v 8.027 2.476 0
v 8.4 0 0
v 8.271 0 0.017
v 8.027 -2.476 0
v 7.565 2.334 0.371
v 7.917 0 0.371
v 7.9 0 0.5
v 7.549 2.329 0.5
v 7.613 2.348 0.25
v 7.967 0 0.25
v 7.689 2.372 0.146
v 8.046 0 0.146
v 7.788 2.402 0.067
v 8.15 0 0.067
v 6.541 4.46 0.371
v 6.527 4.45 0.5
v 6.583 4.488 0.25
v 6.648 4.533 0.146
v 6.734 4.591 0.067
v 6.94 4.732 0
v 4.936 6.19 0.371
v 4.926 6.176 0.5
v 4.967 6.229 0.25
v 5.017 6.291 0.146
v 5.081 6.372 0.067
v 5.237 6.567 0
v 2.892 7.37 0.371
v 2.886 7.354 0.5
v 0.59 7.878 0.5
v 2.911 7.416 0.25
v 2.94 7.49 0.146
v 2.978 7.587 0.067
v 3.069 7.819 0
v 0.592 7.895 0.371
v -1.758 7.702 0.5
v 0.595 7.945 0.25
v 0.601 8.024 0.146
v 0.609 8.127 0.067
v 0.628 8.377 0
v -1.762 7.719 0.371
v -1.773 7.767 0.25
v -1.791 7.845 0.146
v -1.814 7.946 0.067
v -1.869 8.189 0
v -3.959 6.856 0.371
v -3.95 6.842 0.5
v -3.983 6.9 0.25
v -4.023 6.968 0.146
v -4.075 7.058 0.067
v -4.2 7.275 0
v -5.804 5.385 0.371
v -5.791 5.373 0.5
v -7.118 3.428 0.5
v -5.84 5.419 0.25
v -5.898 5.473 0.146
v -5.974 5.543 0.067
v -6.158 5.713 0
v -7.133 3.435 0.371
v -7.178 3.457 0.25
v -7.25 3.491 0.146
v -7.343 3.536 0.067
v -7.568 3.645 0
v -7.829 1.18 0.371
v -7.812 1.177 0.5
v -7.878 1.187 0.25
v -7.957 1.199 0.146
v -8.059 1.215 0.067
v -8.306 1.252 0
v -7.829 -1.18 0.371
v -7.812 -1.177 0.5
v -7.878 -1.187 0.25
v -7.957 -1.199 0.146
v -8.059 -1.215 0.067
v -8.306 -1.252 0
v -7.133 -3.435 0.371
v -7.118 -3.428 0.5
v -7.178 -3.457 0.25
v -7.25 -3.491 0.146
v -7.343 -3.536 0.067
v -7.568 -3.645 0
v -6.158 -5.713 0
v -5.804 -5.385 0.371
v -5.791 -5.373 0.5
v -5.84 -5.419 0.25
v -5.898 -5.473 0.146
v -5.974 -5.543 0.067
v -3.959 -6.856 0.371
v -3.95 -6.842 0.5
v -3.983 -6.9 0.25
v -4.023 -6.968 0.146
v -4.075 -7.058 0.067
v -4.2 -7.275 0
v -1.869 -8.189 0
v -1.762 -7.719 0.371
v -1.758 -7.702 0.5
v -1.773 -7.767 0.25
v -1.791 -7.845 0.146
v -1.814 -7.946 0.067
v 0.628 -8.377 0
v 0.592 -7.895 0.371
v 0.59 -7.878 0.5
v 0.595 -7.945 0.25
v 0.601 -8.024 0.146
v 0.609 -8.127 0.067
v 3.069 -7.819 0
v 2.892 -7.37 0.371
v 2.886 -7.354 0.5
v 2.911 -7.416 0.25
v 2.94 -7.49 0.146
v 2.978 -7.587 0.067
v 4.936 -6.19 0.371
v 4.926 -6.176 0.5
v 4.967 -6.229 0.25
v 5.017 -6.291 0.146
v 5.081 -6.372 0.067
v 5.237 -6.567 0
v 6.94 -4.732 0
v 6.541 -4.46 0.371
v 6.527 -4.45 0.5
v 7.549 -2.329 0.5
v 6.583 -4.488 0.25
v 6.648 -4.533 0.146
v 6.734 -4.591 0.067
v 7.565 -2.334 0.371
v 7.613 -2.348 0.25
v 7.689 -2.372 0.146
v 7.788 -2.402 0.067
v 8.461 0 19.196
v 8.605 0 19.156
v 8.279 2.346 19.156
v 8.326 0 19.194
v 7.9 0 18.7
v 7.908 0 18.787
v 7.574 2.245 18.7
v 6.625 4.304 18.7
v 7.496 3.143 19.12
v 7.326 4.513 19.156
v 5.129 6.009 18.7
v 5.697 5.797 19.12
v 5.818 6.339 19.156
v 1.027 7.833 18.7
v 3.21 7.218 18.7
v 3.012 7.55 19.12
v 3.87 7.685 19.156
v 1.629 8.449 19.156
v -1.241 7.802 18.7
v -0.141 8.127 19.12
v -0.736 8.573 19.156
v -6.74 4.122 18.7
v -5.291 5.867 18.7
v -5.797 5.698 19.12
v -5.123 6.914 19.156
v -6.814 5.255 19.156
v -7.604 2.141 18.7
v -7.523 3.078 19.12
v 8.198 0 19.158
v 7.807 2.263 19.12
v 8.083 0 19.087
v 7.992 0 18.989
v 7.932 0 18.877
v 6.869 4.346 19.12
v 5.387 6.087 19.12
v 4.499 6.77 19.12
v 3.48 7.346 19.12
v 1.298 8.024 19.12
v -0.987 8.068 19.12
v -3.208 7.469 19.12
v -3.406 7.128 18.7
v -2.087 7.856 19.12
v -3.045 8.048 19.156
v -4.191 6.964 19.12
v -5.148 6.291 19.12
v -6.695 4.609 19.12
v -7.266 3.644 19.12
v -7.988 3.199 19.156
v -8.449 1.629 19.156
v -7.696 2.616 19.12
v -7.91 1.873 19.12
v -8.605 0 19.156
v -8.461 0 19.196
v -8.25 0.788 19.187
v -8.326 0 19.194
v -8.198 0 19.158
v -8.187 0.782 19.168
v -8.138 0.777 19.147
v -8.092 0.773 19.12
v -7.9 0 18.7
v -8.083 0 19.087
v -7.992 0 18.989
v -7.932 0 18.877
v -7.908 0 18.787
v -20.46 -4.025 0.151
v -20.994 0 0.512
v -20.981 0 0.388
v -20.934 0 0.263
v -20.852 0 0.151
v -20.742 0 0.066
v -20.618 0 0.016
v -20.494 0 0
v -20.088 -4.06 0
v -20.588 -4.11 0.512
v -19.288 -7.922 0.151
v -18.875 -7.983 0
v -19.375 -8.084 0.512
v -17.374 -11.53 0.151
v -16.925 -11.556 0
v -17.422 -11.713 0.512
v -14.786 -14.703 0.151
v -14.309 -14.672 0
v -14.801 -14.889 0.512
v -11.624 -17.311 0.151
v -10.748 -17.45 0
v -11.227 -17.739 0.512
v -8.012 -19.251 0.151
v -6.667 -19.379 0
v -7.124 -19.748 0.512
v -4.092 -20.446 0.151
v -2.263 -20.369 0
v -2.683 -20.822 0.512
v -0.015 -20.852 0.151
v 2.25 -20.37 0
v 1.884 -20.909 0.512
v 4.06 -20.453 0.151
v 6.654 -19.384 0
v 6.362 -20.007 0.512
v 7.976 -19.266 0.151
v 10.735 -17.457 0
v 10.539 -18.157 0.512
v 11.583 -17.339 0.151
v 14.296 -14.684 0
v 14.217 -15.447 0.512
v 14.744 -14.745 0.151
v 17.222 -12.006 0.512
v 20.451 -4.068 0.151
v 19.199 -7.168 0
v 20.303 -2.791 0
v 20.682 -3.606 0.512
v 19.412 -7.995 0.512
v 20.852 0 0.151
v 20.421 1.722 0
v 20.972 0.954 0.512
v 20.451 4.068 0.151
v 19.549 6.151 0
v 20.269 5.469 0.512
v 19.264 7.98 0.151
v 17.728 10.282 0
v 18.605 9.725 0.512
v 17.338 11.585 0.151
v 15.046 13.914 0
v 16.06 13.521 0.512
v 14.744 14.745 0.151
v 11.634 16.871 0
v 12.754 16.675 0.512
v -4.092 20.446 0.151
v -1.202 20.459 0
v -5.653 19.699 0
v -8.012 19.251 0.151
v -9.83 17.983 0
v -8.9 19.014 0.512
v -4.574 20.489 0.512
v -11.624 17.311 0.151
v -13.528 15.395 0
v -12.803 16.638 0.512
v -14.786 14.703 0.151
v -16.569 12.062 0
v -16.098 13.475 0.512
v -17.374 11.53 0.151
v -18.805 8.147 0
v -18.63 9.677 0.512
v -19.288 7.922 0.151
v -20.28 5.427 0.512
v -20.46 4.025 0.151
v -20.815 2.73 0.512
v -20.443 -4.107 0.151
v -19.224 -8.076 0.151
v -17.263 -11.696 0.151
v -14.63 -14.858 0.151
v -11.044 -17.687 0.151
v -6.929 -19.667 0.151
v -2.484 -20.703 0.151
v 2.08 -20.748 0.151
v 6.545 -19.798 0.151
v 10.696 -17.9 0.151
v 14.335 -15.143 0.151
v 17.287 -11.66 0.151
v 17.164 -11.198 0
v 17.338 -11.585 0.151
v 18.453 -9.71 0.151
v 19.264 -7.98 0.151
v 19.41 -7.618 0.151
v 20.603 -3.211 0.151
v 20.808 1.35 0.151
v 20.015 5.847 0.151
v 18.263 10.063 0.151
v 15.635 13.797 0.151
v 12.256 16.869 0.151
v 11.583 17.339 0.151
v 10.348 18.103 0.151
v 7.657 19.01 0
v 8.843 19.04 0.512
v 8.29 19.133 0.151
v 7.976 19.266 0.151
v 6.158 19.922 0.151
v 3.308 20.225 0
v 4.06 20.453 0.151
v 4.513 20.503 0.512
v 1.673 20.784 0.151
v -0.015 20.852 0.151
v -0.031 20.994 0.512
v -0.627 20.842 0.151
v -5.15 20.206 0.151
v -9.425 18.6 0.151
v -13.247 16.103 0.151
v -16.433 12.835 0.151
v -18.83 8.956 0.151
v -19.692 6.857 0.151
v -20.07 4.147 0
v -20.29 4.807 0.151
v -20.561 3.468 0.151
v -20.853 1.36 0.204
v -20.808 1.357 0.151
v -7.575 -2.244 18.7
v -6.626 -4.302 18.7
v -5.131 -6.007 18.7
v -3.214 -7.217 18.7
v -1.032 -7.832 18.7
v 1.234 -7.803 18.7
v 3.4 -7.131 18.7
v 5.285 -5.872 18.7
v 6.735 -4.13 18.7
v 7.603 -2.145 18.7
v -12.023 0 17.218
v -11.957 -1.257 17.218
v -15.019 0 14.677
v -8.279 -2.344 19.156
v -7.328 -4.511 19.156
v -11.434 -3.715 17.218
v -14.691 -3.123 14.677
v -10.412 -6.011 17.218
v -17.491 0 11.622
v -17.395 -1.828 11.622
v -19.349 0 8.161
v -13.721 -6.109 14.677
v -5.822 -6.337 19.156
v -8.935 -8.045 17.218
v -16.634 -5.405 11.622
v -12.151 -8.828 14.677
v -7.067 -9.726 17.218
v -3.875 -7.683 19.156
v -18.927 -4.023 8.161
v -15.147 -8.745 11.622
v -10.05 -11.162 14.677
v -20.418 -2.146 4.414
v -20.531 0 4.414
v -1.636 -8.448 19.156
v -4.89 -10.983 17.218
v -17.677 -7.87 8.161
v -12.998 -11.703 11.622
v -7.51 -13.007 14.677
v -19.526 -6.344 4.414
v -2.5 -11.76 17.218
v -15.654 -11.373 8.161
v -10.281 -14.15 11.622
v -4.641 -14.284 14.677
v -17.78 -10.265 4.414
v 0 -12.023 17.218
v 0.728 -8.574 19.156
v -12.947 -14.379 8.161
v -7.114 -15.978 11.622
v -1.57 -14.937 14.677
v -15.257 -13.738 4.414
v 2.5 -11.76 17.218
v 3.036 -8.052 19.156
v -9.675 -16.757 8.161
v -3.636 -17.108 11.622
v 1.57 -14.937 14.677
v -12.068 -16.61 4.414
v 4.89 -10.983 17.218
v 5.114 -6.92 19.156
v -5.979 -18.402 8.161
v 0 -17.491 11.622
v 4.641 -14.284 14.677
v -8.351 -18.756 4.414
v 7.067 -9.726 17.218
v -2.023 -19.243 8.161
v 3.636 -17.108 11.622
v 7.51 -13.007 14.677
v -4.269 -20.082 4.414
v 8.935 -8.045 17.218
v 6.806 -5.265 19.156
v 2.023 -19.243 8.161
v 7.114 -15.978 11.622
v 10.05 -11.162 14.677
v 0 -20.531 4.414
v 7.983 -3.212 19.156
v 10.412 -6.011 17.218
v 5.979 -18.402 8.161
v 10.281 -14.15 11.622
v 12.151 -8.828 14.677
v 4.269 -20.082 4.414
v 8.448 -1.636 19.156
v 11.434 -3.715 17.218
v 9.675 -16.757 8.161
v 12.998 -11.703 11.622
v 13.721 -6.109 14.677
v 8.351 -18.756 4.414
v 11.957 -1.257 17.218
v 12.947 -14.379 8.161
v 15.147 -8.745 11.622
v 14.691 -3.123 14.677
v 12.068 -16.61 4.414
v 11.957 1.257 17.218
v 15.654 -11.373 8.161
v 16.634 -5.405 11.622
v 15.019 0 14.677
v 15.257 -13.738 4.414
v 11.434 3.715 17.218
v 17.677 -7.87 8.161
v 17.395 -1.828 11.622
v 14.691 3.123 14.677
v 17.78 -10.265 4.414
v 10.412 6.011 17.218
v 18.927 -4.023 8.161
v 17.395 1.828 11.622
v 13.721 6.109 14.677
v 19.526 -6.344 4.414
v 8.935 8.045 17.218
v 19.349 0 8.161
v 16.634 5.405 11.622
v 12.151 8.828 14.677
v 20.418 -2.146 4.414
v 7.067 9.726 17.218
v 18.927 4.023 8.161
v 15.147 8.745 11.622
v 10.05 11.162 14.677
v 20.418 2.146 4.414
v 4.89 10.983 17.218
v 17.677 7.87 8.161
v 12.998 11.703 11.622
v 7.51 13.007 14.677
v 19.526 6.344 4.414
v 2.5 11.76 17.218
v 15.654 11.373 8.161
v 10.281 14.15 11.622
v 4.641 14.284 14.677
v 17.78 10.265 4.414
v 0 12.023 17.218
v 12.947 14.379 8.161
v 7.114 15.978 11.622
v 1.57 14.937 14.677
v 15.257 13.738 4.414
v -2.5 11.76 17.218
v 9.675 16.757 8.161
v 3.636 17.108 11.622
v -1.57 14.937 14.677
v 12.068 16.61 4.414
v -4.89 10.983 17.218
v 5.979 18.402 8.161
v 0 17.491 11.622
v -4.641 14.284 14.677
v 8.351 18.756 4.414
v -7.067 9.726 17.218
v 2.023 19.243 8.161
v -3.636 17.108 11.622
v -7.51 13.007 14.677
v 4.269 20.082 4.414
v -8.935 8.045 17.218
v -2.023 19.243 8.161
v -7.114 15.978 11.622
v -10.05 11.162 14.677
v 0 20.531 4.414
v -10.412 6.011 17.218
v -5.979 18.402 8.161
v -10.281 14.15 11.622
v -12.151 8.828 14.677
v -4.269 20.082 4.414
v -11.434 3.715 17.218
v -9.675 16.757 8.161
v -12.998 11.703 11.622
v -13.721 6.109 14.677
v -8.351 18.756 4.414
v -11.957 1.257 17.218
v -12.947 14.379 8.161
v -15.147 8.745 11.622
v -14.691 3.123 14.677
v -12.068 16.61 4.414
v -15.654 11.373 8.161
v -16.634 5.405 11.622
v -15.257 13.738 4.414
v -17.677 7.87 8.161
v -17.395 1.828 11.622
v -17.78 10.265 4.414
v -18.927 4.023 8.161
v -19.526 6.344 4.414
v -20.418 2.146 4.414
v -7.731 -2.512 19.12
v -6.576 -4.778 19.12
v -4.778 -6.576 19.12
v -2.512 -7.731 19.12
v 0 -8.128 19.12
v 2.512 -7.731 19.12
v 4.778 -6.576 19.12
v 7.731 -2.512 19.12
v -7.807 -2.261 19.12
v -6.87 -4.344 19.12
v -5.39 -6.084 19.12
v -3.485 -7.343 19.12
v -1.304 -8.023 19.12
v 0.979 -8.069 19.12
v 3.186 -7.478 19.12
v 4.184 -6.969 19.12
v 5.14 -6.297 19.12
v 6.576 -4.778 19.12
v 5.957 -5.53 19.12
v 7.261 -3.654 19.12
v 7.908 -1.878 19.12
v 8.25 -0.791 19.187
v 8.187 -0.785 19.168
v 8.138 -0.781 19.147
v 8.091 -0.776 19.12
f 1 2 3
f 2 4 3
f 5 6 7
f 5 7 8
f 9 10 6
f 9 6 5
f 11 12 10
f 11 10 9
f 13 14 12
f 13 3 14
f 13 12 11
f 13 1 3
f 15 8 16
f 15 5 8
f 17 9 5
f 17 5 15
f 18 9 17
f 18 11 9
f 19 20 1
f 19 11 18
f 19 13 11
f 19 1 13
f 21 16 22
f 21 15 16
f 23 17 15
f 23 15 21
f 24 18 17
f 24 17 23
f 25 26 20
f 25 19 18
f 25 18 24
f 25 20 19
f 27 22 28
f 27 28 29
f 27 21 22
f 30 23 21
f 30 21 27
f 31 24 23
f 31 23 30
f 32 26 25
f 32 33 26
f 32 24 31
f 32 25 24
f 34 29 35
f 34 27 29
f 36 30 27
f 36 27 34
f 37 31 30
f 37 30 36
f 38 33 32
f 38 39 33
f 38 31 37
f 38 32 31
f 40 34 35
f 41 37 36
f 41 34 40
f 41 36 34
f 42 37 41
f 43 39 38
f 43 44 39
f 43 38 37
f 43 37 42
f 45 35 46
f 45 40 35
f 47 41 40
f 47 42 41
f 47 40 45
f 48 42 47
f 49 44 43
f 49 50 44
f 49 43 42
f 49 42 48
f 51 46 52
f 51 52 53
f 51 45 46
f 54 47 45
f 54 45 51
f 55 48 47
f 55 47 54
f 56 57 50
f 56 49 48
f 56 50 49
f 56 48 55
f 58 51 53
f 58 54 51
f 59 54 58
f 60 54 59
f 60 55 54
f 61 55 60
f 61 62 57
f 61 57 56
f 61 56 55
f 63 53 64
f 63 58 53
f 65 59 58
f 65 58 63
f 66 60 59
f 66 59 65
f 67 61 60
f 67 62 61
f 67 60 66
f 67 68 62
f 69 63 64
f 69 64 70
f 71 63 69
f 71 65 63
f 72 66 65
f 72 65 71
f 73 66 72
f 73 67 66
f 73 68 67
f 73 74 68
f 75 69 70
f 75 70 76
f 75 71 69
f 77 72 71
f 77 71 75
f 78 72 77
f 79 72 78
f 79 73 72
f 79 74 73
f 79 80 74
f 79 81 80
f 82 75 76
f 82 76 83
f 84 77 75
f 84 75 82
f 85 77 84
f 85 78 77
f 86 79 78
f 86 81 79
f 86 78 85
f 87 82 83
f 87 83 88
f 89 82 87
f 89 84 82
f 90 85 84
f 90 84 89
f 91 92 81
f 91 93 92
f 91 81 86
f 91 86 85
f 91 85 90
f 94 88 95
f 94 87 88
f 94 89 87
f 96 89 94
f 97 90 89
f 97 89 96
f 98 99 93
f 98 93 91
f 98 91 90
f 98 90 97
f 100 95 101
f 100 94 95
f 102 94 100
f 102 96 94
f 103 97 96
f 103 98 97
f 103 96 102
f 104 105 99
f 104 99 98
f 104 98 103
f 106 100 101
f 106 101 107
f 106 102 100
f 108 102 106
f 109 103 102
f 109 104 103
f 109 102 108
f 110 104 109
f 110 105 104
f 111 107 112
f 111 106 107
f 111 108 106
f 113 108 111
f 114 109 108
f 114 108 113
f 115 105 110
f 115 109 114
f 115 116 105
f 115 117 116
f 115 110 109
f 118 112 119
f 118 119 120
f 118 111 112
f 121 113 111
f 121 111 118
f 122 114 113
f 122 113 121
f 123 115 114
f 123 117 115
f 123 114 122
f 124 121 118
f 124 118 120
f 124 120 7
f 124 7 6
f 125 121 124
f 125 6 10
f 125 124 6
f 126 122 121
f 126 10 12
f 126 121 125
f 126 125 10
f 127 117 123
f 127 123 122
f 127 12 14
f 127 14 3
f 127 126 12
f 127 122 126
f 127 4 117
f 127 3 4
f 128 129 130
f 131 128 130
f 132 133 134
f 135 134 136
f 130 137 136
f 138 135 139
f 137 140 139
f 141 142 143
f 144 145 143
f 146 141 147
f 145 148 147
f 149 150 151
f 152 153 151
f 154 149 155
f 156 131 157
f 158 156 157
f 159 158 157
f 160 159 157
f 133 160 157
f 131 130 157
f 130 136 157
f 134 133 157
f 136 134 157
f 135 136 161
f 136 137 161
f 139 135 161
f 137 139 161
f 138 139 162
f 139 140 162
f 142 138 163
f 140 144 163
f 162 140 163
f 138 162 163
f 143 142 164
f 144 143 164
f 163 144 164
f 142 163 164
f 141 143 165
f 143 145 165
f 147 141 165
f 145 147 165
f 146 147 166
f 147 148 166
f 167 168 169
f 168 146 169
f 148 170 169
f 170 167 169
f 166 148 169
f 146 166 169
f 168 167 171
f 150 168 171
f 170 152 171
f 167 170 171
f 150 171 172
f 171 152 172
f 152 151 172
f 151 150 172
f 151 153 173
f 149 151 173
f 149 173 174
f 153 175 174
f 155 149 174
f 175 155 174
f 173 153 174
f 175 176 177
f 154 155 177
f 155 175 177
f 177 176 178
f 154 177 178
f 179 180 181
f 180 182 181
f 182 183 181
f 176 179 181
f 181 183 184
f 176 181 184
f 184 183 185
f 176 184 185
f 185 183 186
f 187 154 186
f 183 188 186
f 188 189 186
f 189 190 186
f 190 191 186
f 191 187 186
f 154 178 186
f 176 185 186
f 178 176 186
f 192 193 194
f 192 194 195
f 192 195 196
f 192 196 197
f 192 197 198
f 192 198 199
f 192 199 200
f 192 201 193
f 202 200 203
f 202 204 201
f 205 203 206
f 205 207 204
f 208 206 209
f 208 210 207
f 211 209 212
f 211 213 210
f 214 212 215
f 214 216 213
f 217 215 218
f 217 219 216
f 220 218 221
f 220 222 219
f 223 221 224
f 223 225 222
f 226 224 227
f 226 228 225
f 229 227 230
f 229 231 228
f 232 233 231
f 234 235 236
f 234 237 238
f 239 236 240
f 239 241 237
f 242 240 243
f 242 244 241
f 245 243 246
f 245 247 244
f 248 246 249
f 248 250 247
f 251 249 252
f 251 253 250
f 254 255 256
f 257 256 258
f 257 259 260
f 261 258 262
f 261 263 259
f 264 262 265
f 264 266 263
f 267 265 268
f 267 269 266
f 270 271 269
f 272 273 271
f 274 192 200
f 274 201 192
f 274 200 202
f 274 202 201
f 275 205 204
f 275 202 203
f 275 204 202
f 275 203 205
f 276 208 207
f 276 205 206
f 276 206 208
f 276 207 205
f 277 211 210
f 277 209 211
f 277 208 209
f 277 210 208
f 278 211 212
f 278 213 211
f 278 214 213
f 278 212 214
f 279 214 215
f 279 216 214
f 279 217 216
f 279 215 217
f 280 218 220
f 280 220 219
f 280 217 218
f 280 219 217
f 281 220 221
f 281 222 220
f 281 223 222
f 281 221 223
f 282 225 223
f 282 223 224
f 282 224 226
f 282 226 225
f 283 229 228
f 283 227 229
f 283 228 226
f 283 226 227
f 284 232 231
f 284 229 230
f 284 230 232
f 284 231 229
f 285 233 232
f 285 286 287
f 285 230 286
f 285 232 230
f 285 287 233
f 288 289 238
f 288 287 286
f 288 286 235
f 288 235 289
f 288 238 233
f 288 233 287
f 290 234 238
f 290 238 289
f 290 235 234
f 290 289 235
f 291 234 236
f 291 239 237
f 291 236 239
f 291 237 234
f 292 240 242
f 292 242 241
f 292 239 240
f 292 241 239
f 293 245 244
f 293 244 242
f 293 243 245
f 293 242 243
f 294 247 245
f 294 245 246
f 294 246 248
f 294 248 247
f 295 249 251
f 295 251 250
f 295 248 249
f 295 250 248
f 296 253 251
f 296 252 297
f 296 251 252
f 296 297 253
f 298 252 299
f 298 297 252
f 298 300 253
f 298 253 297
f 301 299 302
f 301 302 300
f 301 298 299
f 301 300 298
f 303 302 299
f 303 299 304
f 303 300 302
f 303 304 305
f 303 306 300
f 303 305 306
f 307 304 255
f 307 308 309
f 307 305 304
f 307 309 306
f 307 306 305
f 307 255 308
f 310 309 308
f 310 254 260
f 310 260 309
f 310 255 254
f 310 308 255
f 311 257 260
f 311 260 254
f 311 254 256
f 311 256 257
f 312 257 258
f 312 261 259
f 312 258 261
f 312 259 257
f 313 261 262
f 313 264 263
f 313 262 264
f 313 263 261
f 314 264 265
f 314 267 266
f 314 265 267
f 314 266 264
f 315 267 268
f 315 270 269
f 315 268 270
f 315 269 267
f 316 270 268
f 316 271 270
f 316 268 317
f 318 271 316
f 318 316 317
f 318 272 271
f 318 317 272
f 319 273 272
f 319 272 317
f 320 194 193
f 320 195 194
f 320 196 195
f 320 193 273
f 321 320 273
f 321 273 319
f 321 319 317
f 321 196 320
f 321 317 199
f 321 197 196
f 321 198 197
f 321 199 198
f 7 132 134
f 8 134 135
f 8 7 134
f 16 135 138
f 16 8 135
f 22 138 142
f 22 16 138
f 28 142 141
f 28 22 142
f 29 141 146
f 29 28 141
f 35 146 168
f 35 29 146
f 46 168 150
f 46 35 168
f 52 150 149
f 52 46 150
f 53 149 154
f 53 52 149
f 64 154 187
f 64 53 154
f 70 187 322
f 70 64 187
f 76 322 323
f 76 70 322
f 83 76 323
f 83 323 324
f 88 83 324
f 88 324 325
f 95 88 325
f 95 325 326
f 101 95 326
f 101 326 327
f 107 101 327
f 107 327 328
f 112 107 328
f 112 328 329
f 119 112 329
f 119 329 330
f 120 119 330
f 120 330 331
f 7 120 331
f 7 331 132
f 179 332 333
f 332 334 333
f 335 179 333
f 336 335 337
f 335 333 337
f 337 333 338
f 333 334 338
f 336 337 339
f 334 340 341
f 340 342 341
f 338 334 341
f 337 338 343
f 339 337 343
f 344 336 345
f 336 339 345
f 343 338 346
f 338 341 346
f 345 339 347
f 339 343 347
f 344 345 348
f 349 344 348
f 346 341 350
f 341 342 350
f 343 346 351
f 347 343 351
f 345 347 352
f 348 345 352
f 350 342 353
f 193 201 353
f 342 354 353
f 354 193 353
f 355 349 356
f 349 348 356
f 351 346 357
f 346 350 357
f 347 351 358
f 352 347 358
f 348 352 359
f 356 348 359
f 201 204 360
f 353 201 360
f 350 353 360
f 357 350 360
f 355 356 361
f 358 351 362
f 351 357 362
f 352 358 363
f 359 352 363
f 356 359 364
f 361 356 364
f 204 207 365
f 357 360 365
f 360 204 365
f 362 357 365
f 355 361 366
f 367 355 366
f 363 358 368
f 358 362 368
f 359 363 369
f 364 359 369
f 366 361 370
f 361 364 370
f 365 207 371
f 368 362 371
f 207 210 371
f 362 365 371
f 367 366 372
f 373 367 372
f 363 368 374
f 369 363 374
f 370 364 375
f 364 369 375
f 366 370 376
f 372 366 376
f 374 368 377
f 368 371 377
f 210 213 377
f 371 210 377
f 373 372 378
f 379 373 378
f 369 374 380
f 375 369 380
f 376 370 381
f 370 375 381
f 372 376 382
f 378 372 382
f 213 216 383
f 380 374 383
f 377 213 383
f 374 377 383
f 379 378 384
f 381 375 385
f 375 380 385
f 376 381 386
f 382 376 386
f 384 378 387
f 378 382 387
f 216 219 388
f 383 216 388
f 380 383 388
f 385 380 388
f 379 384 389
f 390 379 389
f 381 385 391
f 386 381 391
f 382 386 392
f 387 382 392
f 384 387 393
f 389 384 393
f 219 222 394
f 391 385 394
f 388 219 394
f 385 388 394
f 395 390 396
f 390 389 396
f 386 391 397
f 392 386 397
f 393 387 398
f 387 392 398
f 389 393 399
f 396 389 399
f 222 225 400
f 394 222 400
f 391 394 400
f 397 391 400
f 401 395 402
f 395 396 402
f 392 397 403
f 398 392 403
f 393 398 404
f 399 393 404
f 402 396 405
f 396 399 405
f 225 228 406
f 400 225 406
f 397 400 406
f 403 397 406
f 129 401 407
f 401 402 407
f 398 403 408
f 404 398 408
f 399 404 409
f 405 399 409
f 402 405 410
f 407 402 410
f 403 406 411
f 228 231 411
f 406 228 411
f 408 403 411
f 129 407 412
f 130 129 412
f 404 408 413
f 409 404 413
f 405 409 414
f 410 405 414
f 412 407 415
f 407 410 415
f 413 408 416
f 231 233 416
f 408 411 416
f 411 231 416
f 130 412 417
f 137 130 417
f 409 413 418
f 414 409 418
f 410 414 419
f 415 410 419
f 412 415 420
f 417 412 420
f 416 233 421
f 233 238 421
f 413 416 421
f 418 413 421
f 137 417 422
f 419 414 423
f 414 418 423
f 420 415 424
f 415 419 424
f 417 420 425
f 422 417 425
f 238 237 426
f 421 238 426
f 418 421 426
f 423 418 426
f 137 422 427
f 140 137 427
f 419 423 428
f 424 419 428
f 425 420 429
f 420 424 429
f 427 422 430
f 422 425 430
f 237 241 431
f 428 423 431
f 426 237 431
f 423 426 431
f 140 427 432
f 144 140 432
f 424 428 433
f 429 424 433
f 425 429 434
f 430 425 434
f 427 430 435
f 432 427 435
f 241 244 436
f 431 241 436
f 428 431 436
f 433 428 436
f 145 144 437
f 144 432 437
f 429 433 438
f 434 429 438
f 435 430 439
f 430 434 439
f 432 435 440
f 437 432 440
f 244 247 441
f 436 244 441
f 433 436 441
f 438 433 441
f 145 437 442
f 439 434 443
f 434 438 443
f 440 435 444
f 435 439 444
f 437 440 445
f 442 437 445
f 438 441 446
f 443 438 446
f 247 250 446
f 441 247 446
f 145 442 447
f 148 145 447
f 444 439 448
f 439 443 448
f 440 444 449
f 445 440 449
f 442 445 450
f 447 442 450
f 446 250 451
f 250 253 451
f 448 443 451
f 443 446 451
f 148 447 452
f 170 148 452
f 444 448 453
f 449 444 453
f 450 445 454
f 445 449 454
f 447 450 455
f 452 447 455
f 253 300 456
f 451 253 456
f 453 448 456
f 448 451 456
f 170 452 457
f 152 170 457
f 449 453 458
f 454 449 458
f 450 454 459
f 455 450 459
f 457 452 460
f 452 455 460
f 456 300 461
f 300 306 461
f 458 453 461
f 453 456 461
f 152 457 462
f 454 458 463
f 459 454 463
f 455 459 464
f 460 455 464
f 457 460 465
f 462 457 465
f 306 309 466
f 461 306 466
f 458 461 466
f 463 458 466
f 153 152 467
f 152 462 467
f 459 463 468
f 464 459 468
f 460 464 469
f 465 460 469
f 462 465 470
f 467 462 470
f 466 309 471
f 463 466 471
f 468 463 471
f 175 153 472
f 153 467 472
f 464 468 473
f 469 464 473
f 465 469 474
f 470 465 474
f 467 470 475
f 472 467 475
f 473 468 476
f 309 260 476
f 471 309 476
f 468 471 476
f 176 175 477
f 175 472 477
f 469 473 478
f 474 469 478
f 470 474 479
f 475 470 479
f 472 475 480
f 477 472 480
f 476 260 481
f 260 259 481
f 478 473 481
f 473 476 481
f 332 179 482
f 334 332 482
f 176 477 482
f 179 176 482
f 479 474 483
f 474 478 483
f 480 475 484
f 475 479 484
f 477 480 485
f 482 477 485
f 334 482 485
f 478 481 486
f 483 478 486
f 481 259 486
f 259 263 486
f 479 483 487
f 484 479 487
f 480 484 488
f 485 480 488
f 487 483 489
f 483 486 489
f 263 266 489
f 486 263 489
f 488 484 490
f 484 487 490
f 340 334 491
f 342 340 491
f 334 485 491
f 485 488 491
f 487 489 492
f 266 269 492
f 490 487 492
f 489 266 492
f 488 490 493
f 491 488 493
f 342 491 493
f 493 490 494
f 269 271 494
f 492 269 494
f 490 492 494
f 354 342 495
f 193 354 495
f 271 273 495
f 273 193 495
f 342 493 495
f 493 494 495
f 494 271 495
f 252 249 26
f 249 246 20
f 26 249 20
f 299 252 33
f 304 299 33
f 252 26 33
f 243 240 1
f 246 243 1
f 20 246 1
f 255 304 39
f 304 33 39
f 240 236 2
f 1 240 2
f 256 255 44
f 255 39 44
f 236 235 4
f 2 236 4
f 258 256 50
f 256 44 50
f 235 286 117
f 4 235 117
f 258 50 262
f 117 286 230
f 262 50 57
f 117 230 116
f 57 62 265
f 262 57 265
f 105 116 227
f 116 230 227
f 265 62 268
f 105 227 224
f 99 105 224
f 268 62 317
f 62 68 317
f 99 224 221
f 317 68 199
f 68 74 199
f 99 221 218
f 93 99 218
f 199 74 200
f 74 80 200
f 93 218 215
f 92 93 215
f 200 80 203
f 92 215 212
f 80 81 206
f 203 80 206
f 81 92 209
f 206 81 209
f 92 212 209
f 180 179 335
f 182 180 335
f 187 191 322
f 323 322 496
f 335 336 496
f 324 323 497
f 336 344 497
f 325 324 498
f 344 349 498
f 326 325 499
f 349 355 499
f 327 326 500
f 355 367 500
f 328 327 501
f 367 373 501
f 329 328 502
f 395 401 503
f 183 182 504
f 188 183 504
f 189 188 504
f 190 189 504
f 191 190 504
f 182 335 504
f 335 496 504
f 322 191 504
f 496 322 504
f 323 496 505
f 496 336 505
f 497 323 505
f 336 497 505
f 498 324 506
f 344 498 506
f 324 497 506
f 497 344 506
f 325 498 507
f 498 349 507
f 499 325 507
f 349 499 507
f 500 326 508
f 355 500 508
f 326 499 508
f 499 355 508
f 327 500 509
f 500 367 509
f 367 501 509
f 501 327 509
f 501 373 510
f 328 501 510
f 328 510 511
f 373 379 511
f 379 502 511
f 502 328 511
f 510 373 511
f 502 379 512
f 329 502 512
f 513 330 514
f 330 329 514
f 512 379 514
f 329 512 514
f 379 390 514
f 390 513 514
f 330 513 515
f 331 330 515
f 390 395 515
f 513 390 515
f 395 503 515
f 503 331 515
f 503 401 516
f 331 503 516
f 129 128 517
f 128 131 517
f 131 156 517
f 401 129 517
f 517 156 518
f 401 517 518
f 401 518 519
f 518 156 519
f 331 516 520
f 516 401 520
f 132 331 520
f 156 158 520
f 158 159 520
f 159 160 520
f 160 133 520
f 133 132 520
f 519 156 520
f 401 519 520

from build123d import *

# Parameters (mm, degrees)
F3_R     = 7.9
F4_DEPTH = 21.001
F5_R     = 0.5


with BuildPart() as f2:
    # F1 (on Front) → F2 (revolve)
    with BuildSketch(Plane.XZ):
        with BuildLine():
            ThreePointArc((0, 21), (-14.8492424049, 14.8492424049), (-21, 0))
            Line((-21, 0), (0, 0))
            Line((0, 0), (0, 21))
        make_face()
    revolve(axis=Axis((0, 0, 10.5), (0, 0, 1)))

    # F3 (on Top) → F4 (cut, through all)
    with BuildSketch(Plane.XY):
        Circle(F3_R)
    extrude(amount=F4_DEPTH, mode=Mode.SUBTRACT)

    # F5
    f5_edges = [f2.edges().sort_by_distance(p)[0] for p in [
        (21, 0, 0),
        (-7.9, 0, 0),
        (0, 7.9, 19.457389),
        (0, -7.9, 19.457389),
    ]]
    fillet(f5_edges, radius=F5_R)


solid = f2.part
